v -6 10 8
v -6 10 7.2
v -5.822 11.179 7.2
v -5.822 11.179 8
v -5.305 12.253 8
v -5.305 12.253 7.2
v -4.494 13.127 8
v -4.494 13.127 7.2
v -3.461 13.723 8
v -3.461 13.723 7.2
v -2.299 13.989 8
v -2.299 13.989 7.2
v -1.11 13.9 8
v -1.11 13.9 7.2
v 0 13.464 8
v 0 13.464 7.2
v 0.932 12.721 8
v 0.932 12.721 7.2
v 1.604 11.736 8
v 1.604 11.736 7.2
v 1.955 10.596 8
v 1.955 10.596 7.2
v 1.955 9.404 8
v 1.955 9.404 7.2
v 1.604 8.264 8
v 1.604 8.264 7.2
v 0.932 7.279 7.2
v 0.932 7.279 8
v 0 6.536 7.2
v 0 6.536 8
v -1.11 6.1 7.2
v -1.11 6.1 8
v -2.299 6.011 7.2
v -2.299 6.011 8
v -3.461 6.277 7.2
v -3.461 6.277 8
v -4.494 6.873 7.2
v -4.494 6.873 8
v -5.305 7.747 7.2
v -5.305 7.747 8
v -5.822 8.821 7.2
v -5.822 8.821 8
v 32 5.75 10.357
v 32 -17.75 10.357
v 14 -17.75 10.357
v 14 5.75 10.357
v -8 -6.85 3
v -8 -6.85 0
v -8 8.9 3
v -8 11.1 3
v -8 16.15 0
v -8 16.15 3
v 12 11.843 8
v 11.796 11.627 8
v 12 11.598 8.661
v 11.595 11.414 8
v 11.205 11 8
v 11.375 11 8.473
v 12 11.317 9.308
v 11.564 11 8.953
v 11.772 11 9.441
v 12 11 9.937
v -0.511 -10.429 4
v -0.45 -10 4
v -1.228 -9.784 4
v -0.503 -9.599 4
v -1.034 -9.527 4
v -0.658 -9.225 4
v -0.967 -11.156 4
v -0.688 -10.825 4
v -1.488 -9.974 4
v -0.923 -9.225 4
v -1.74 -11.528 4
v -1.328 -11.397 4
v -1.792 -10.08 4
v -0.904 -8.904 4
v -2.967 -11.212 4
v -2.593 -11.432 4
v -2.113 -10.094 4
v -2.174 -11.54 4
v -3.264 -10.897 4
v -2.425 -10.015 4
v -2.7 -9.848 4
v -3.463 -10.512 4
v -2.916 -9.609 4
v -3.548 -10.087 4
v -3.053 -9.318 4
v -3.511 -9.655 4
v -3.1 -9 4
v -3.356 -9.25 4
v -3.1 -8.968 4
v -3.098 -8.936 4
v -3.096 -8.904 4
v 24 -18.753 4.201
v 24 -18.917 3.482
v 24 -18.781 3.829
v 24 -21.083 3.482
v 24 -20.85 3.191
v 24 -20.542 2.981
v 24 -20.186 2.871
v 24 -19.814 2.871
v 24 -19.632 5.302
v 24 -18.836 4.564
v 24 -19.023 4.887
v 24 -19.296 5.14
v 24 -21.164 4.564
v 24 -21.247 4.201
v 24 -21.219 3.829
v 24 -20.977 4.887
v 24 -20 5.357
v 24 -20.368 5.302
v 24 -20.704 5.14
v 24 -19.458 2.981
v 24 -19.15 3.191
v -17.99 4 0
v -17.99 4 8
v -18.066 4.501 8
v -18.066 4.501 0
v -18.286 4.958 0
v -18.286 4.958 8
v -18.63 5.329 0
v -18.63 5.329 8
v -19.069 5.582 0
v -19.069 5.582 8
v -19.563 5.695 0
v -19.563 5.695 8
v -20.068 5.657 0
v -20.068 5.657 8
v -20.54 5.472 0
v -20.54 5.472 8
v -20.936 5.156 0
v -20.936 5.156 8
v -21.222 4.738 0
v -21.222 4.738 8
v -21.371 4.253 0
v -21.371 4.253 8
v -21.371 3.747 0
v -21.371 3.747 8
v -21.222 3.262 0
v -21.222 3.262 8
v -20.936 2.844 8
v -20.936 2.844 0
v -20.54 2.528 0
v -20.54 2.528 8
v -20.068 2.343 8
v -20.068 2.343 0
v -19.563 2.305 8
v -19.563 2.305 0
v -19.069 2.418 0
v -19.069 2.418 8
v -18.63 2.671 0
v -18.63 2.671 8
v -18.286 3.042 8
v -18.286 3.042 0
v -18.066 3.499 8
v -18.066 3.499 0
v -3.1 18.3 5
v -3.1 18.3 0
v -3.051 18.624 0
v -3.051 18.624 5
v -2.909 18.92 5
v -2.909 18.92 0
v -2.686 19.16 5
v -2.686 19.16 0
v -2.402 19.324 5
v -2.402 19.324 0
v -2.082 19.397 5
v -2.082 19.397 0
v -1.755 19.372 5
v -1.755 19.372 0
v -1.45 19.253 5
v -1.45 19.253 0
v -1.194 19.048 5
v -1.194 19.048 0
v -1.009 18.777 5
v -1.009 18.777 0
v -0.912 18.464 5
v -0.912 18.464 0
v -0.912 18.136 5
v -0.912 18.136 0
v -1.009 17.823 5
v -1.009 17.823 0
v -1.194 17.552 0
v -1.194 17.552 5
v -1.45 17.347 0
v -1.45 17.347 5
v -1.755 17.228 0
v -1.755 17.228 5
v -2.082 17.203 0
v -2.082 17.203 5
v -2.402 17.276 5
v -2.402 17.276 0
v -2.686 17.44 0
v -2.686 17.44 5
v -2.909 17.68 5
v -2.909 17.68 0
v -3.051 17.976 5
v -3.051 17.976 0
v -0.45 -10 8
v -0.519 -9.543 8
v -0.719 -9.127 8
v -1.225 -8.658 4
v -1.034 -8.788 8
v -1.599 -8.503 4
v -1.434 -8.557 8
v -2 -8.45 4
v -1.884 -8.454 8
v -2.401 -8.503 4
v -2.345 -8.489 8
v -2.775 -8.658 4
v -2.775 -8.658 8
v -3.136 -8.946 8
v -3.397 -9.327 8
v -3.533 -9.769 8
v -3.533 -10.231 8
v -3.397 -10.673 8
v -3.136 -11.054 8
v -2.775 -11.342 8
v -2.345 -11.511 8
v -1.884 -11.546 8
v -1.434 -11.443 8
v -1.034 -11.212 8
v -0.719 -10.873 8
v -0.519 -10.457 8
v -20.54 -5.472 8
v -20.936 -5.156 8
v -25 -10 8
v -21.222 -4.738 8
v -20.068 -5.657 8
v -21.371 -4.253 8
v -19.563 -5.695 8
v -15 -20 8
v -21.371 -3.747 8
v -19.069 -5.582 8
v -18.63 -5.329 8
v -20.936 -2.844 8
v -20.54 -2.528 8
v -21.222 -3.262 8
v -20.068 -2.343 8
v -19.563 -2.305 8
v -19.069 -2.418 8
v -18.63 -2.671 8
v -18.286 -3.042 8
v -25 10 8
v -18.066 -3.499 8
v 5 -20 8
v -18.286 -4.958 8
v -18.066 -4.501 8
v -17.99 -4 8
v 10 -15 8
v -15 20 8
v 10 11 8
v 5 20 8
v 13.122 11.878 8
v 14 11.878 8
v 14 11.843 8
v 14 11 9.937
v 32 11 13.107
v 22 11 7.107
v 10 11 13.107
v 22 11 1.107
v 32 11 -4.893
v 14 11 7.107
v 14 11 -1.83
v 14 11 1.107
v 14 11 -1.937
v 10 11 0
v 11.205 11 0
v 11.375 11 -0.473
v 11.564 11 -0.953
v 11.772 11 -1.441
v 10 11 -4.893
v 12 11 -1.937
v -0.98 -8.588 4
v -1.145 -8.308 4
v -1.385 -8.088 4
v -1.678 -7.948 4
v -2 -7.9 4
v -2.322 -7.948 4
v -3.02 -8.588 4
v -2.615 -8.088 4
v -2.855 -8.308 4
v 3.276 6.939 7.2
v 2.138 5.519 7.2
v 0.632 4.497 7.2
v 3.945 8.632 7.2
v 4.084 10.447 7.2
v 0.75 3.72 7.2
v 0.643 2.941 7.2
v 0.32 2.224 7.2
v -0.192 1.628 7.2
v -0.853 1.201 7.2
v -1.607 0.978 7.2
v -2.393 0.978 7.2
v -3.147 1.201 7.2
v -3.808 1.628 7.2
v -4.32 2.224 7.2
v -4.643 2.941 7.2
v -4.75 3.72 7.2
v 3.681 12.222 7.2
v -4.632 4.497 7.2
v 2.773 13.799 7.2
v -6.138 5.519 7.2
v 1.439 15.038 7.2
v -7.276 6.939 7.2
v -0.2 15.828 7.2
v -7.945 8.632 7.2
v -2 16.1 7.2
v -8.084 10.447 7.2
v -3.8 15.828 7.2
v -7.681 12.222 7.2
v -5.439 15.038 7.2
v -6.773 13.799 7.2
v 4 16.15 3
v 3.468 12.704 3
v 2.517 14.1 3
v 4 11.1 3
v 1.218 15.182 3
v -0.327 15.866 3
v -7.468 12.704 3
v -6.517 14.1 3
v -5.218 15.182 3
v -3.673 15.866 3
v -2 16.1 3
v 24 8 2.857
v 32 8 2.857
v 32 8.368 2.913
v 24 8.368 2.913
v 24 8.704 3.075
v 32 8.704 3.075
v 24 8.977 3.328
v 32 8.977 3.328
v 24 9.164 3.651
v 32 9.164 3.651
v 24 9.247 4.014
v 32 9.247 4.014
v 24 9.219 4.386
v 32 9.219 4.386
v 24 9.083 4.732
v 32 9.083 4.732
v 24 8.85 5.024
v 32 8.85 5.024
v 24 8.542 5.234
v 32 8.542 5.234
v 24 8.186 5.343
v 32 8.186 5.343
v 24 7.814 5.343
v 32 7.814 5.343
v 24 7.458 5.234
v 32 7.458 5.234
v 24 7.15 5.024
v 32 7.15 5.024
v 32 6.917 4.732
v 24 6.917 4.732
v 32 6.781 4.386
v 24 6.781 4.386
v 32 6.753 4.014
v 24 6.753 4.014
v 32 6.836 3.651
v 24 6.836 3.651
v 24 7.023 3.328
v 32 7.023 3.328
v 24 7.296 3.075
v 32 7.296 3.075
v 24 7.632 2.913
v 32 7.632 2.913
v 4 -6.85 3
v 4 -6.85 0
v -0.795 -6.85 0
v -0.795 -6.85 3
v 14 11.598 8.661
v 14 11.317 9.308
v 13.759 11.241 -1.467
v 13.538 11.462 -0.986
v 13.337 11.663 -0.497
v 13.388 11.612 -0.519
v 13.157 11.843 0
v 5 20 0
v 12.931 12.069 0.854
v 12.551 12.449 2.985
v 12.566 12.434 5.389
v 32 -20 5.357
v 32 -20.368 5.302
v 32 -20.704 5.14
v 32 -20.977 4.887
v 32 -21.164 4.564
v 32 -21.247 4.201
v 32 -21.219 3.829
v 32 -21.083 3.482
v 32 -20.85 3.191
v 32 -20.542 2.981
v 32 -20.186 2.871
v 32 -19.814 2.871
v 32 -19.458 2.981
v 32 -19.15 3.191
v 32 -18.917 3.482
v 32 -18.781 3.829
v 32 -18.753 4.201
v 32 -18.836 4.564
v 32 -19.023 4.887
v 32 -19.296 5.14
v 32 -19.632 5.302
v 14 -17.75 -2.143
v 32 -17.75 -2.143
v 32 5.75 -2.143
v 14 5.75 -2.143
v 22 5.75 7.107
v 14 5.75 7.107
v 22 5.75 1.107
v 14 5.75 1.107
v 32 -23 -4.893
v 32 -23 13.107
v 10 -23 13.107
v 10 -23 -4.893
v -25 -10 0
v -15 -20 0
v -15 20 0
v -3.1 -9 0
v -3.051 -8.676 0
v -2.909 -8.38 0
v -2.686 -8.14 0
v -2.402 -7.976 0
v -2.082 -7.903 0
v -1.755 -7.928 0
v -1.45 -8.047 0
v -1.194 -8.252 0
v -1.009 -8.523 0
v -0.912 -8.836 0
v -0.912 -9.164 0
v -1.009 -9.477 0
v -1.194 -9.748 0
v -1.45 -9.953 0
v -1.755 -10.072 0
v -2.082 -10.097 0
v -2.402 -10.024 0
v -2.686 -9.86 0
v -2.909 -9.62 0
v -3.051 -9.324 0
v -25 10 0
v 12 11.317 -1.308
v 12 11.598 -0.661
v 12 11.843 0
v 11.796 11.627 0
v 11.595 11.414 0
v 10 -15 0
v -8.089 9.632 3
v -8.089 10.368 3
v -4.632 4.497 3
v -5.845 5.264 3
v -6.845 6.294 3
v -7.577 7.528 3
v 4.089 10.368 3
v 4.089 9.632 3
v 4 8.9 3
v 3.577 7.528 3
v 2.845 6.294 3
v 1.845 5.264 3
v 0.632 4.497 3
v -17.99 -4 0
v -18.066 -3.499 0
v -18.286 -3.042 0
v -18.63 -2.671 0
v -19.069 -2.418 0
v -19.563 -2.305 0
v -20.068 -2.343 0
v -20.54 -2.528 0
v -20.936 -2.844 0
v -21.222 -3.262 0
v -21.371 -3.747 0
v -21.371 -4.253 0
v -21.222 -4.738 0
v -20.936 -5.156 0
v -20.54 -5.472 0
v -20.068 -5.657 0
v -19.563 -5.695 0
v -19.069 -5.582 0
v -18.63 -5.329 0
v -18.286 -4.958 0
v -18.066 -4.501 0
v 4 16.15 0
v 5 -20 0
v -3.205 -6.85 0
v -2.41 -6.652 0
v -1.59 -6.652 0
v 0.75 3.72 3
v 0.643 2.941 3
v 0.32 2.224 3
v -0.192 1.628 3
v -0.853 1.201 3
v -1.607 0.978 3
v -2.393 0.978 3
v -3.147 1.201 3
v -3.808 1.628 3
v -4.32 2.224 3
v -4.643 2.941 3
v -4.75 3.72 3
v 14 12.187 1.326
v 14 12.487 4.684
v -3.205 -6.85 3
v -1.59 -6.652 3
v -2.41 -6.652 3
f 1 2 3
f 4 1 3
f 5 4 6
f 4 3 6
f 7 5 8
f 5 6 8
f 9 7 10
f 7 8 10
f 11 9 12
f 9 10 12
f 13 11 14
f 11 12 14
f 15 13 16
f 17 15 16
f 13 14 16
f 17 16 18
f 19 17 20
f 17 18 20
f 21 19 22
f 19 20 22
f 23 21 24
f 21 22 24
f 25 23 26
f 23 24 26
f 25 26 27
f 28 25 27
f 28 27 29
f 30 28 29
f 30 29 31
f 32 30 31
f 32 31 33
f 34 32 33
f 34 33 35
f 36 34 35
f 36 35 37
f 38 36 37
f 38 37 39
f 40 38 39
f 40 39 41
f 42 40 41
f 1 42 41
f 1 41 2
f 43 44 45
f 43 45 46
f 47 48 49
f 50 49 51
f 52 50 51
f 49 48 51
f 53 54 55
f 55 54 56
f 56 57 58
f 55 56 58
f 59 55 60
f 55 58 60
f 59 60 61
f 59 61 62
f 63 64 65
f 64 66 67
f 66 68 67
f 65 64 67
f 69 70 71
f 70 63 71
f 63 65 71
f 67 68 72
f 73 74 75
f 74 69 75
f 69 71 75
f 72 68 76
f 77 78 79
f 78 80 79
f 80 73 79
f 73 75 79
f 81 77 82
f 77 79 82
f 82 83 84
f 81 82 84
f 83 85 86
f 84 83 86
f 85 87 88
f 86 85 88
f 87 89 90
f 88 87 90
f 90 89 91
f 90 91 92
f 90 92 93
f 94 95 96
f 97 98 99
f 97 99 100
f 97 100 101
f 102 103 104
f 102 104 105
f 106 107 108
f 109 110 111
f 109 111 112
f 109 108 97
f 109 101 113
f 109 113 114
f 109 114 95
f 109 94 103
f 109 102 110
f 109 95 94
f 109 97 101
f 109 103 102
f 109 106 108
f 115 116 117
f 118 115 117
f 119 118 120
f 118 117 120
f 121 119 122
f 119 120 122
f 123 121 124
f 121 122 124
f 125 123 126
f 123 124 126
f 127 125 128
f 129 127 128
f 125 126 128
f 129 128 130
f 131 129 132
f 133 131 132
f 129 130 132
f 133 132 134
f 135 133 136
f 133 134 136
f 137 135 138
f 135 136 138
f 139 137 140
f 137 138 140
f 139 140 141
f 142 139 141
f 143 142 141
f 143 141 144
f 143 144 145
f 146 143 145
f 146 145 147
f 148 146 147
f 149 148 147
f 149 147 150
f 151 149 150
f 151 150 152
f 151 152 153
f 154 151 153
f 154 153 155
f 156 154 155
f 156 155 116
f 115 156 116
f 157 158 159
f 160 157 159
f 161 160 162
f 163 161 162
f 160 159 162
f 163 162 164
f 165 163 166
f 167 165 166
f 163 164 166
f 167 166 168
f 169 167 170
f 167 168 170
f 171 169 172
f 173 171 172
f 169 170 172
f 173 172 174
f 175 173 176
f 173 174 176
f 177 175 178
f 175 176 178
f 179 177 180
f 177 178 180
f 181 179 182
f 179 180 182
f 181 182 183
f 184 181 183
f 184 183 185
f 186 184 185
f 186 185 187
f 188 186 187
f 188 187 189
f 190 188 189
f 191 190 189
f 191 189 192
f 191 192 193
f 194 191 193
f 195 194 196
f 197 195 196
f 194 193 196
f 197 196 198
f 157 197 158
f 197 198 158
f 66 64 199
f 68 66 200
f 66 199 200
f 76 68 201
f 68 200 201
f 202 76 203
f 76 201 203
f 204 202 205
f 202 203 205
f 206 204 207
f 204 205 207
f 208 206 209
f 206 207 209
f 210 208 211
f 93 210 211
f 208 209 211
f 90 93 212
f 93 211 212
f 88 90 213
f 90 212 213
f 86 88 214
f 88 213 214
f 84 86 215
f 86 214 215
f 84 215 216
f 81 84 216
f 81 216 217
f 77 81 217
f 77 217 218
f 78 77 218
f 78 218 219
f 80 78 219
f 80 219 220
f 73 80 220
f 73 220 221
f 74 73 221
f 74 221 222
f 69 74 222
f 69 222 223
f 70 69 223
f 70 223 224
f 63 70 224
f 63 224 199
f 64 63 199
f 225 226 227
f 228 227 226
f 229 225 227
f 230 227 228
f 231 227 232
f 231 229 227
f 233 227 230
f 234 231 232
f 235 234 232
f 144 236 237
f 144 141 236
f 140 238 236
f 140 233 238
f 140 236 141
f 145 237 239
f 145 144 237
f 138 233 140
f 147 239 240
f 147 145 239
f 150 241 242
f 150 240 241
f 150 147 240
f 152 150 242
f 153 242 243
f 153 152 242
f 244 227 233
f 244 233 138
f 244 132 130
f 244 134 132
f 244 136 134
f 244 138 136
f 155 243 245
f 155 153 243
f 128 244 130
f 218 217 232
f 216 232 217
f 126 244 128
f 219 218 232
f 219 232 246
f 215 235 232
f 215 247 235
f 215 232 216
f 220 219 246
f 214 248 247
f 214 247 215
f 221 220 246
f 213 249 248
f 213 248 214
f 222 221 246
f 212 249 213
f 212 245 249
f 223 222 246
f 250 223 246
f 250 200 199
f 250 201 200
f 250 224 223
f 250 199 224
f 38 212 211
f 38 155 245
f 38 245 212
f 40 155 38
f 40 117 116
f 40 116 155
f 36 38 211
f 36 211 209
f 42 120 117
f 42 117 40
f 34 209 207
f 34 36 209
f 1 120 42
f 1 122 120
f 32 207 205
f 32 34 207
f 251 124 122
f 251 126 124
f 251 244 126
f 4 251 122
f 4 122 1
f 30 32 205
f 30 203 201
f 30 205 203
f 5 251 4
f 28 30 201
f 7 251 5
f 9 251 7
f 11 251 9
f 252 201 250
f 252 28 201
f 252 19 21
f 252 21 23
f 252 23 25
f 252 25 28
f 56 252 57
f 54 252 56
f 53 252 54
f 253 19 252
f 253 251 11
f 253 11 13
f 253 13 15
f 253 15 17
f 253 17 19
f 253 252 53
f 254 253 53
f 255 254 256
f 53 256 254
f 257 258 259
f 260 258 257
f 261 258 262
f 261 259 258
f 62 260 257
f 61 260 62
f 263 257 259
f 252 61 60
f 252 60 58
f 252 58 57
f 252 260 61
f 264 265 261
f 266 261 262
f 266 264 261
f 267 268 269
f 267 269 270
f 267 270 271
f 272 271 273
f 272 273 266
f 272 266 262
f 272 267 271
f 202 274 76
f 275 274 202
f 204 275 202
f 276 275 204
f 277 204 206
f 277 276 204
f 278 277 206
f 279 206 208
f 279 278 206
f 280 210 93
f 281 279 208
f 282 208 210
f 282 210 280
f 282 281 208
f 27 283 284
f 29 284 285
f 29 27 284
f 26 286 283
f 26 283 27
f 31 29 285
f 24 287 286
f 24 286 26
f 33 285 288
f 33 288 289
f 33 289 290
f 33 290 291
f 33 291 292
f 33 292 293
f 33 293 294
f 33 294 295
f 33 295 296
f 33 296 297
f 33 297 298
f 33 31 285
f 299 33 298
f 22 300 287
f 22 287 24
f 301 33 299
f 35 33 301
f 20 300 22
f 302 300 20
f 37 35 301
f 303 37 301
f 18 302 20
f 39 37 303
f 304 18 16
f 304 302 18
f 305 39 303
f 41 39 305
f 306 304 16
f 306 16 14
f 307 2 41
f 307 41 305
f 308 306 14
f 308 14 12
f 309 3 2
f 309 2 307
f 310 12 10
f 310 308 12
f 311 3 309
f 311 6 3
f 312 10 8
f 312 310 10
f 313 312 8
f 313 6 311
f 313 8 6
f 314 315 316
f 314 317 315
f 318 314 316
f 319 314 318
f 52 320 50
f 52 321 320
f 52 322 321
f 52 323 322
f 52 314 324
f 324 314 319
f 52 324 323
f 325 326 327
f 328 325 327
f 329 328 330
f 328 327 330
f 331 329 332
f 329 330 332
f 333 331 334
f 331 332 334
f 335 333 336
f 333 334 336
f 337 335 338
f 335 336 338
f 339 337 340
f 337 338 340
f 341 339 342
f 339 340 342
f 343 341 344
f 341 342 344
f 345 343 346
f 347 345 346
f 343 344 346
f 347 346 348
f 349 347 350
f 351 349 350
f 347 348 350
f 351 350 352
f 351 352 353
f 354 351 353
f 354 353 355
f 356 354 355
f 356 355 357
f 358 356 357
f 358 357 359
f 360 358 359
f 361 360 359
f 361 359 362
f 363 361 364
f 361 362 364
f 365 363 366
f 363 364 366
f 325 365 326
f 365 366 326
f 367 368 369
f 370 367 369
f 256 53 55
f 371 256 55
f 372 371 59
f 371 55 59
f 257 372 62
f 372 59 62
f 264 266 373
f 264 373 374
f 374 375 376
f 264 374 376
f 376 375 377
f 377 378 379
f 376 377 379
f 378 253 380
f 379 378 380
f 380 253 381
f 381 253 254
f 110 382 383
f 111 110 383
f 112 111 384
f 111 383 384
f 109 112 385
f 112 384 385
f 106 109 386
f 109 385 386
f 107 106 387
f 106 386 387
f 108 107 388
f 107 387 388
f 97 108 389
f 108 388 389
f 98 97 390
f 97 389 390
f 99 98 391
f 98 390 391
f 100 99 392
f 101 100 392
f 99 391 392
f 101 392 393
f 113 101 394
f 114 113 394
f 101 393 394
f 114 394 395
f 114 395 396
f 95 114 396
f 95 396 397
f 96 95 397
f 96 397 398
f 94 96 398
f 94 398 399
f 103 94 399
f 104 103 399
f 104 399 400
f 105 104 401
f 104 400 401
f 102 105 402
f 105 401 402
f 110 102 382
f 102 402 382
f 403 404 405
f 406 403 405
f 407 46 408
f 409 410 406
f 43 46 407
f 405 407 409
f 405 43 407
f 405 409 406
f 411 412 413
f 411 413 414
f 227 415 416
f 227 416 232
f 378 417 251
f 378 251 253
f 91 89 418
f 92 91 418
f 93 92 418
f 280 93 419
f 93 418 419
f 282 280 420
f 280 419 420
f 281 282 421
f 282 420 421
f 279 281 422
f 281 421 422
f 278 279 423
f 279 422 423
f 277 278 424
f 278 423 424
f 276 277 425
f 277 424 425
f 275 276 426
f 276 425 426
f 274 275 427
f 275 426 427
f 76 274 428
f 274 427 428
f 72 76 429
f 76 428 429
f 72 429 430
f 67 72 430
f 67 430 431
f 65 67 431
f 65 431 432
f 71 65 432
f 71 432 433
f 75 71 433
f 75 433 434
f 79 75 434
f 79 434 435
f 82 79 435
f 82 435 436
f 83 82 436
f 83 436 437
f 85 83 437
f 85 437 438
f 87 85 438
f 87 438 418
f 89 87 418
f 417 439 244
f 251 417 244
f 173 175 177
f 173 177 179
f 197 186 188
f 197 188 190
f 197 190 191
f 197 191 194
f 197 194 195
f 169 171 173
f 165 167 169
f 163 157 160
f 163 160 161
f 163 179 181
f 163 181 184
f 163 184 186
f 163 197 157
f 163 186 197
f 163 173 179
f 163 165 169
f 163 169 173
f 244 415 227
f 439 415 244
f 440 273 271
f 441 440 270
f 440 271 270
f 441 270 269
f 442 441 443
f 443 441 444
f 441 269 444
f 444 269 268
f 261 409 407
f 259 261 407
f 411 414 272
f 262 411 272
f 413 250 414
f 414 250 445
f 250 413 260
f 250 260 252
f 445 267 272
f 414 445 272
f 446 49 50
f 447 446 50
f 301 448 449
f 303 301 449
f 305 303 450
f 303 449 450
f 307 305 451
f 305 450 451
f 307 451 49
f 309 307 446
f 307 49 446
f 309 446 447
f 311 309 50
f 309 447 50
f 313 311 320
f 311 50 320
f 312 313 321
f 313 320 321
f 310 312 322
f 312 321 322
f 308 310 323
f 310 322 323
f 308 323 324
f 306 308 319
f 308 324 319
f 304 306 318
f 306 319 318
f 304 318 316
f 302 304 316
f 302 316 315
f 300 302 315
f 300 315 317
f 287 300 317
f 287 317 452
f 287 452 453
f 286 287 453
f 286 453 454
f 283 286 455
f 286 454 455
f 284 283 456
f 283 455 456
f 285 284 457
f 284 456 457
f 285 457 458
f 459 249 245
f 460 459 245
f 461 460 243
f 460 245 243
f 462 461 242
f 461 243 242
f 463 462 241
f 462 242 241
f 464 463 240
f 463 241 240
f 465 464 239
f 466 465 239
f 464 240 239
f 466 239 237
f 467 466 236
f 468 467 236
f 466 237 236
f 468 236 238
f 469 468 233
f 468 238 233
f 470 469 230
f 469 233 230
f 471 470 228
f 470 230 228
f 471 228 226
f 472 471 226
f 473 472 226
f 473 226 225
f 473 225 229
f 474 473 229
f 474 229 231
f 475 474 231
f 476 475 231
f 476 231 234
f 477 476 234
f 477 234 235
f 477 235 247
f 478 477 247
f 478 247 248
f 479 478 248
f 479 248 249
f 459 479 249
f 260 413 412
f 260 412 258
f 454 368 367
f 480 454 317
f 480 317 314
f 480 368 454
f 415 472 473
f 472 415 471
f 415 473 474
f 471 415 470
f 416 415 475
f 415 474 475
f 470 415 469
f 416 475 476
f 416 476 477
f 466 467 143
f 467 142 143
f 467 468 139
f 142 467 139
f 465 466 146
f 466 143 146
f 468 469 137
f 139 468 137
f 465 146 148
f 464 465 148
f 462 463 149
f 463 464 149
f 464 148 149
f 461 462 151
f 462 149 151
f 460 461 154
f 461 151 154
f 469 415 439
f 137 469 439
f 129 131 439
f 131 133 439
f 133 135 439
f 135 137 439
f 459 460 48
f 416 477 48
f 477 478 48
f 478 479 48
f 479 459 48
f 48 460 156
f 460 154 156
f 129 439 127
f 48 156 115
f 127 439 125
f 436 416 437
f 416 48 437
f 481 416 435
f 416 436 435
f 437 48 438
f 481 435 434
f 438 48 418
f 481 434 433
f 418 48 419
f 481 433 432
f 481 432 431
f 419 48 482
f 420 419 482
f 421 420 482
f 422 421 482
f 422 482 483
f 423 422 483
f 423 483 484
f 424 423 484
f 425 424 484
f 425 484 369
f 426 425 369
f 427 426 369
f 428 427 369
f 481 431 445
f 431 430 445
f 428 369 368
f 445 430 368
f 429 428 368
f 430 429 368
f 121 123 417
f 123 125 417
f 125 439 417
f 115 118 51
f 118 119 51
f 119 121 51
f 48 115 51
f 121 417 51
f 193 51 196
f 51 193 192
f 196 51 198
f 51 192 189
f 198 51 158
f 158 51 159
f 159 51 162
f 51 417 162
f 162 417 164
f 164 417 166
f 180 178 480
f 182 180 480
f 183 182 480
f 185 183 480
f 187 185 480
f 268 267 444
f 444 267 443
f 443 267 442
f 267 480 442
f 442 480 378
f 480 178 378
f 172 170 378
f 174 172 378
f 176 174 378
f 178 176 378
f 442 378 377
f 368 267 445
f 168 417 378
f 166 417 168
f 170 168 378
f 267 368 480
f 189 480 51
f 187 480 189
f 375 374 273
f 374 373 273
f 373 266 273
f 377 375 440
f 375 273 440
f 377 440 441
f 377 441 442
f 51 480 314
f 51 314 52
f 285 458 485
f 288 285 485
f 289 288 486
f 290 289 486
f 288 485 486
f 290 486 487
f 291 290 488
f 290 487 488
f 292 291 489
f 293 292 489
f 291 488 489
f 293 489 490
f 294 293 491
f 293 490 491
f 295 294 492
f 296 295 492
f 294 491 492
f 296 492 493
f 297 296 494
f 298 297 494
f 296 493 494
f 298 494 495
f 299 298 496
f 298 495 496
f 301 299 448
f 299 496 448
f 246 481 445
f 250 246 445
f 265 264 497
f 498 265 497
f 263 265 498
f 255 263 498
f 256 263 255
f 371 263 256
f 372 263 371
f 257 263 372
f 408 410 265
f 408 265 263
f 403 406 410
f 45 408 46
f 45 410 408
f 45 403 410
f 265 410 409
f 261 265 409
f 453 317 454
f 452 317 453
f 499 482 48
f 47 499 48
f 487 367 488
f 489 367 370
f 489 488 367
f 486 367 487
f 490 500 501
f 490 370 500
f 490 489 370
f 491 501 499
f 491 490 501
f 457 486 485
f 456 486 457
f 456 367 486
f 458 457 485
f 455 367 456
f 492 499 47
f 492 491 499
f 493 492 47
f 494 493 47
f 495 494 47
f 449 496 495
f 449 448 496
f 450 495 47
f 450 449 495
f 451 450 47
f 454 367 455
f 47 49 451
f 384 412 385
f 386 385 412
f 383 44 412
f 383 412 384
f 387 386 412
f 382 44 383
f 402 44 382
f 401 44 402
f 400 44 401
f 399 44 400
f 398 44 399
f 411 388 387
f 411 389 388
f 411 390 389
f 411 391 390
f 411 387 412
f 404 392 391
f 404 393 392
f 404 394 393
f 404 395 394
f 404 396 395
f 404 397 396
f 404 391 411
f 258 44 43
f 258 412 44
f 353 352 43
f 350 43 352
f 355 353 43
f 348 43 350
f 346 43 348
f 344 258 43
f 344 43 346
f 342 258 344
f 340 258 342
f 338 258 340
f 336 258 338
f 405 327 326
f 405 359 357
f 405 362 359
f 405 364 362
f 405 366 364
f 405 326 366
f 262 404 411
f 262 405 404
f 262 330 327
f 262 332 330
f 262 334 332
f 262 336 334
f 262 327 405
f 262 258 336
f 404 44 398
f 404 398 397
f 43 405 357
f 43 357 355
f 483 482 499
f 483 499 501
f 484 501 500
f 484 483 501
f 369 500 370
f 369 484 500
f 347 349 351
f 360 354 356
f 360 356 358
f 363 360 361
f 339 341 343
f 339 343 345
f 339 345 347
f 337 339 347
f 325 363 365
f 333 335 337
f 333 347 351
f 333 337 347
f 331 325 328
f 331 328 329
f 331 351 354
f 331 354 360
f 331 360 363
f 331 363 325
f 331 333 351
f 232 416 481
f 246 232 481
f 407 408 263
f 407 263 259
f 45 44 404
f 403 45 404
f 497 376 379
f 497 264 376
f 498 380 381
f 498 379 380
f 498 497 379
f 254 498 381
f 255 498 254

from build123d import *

# Parameters (mm, degrees)
SKETCH_1_W                = 50
SKETCH_1_H                = 40
EXTRUDE_1_DEPTH           = 8
CHAMFER_1_SIZE            = 10
SKETCH_2_R                = 1.55
CUT_EXTRUDE_1_DEPTH       = 10
EXTRUDE_2_DEPTH           = 40
EXTRUDE_2_DEPTH_BACK      = 15
SKETCH_3_R                = 12.5
SKETCH_4_R                = 1.7
CUT_EXTRUDE_2_DEPTH       = 15
CUT_EXTRUDE_START         = -20
CUT_EXTRUDE_3_DEPTH       = 20
SKETCH_7_R                = 16.5
CUT_EXTRUDE_8_DEPTH       = 33
CUT_EXTRUDE_9_DEPTH       = 20
CHAMFER_3_SIZE            = 2
SKETCH_10_OUTSIDE_W       = 47.322
SKETCH_10_OUTSIDE_H       = 62.322
SKETCH_10_OUTSIDE_R       = 12.5
CUT_EXTRUDE_10_DEPTH      = 10
CHAMFER_4_SIZE            = 10
SKETCH_12_W               = 1.5
SKETCH_12_H               = 20
SKETCH_14_W               = 12
SKETCH_14_H               = 23
CUT_EXTRUDE_11_DEPTH      = 3
CUT_EXTRUDE_12_DEPTH      = 4.2
SKETCH_16_R               = 1.1
CUT_EXTRUDE_13_DEPTH      = 5
SKETCH_17_R               = 3.372674955
EXTRUDE_3_DEPTH           = 4
SKETCH_18_R               = 1.1
CUT_EXTRUDE_14_DEPTH      = 4
SKETCH_20_R               = 4
CUT_EXTRUDE_15_DEPTH      = 4
CUT_EXTRUDE_16_DEPTH      = 70.980354503
CUT_EXTRUDE_16_DEPTH_BACK = 70.980354503
SKETCH_21_W               = 56.3061188
SKETCH_21_H               = 46.683670243
EXTRUDE_4_DEPTH           = 18
EXTRUDE_4_DEPTH_BACK      = 4
SKETCH_22_W               = 18
SKETCH_22_H               = 34
SKETCH_23_W               = 12.5
SKETCH_23_H               = 23.5
CUT_EXTRUDE_17_DEPTH      = 18
SKETCH_24_R               = 1.25
CUT_EXTRUDE_18_DEPTH      = 8
CUT_EXTRUDE_19_DEPTH      = 64.641574462
SKETCH_26_W               = 8
SKETCH_26_H               = 6
CUT_EXTRUDE_20_DEPTH      = 20


# Read off the part's stored shape, not the designer's step: 切除-拉伸3
with BuildPart() as part:
    # 草图1 → 凸台-拉伸1 (new body)
    with BuildSketch(Plane.XY):
        Rectangle(SKETCH_1_W, SKETCH_1_H)
    extrude(amount=EXTRUDE_1_DEPTH)

    # 倒角1
    chamfer_1_edges = [part.edges().sort_by_distance(p)[0] for p in [
        (-25, -20, 4),
        (-25, 20, 4),
    ]]
    chamfer(chamfer_1_edges, length=CHAMFER_1_SIZE)

    # 草图2 → 切除-拉伸1 (cut)
    with BuildSketch(Plane.XY.offset(8)):
        with Locations((-2, -10)):
            Circle(SKETCH_2_R)
        with Locations((-2, 10)):
            Circle(SKETCH_2_R)
    extrude(amount=-CUT_EXTRUDE_1_DEPTH, mode=Mode.SUBTRACT)

    # 草图3 → 凸台-拉伸2 (add, two sides: drawn at the far end of the back side and taken through both)
    with BuildSketch(Plane(origin=(25, 0, 0), x_dir=(0, 0, -1), z_dir=(1, 0, 0)).offset(-EXTRUDE_2_DEPTH_BACK)):
        with Locations(Location((-4, 0, 0), (0, 0, 251.337075115))):
            Circle(SKETCH_3_R)
    extrude(amount=EXTRUDE_2_DEPTH + EXTRUDE_2_DEPTH_BACK)

    # 草图4 → 切除-拉伸2 (cut)
    with BuildSketch(Plane.XY.offset(8)):
        with Locations((-19.690178066, -4)):
            Circle(SKETCH_4_R)
        with Locations((-19.690178066, 4)):
            Circle(SKETCH_4_R)
    extrude(amount=-CUT_EXTRUDE_2_DEPTH, mode=Mode.SUBTRACT)

    # 切除-拉伸3 outline → 切除-拉伸3 (cut)
    with BuildSketch(Plane(origin=(65, 0, 0), x_dir=(0, 0, -1), z_dir=(1, 0, 0)).offset(CUT_EXTRUDE_START)):
        with BuildLine():
            Line((7.456439237, -5), (-15.456439237, -5))
            ThreePointArc((-15.456439237, -5), (-4, -12.5), (7.456439237, -5))
        make_face()
        with BuildLine():
            ThreePointArc((7.456439237, 5), (-4, 12.5), (-15.456439237, 5))
            Line((-15.456439237, 5), (7.456439237, 5))
        make_face()
    extrude(amount=CUT_EXTRUDE_3_DEPTH, mode=Mode.SUBTRACT)

    # 草图7 → 切除-拉伸8 (cut)
    with BuildSketch(Plane.XZ.offset(5)):
        with Locations((48.5, 4)):
            Circle(SKETCH_7_R)
    cut_extrude_8 = extrude(amount=CUT_EXTRUDE_8_DEPTH, mode=Mode.SUBTRACT)

    # 镜向1: 切除-拉伸8 across plane
    add(cut_extrude_8.mirror(Plane.ZX), mode=Mode.SUBTRACT)

    # 草图8 → 切除-拉伸9 (cut)
    with BuildSketch(Plane.XZ.offset(5)):
        with BuildLine():
            Line((50, 19.107397707), (75.764252489, 33.62580965))
            Line((75.764252489, 33.62580965), (78.826270749, -18.347337912))
            Line((78.826270749, -18.347337912), (50, -10.892602293))
            ThreePointArc((50, -10.892602293), (65, 4.107397707), (50, 19.107397707))
        make_face()
    extrude(amount=-CUT_EXTRUDE_9_DEPTH, mode=Mode.SUBTRACT)

    # 倒角3
    chamfer_3_edges = [part.edges().sort_by_distance(p)[0] for p in [
        (10, 0, 16.5),
        (10, 0, -8.5),
    ]]
    chamfer(chamfer_3_edges, length=CHAMFER_3_SIZE)

    # 草图10 outside → 切除-拉伸10 (cut)
    with BuildSketch(Plane(origin=(25, 0, 0), x_dir=(0, 0, -1), z_dir=(1, 0, 0))):
        with Locations((-4, 0)):
            Rectangle(SKETCH_10_OUTSIDE_W, SKETCH_10_OUTSIDE_H)
        with Locations((-4.107397707, 0)):
            Circle(SKETCH_10_OUTSIDE_R, mode=Mode.SUBTRACT)
    extrude(amount=-CUT_EXTRUDE_10_DEPTH, mode=Mode.SUBTRACT)

    # 倒角4
    # the kernel refuses this chamfer: 10 mm, written as the material it takes off along each edge
    with BuildSketch(Plane(origin=(15, -20, -25.71682988), x_dir=(-0.9996219169112968, -0.027495876610586317, 0), z_dir=(0, 0, 1))) as chamfer_4_piece_1_section:
        Polygon((CHAMFER_4_SIZE * 0.999621916911, -CHAMFER_4_SIZE * 0.0274958766106), (-CHAMFER_4_SIZE * 0.0274958766106, -CHAMFER_4_SIZE * 0.999621916911), (0, 0), align=None)
    chamfer_4_piece_1 = extrude(amount=59.433659759, mode=Mode.PRIVATE)
    chamfer_4_piece_1 = chamfer_4_piece_1 - Plane(origin=(11.669205873, 0, 4.107397707), x_dir=(0, 0, -1), z_dir=(1, 0, 0)) * Cylinder(12.5, 159, mode=Mode.PRIVATE)
    add(chamfer_4_piece_1, mode=Mode.SUBTRACT)
    with BuildSketch(Plane(origin=(15, 20, 33.71682988), x_dir=(-0.9996219169112968, 0.027495876610586317, 0), z_dir=(0, 0, -1))) as chamfer_4_piece_2_section:
        Polygon((CHAMFER_4_SIZE * 0.999621916911, -CHAMFER_4_SIZE * 0.0274958766106), (-CHAMFER_4_SIZE * 0.0274958766106, -CHAMFER_4_SIZE * 0.999621916911), (0, 0), align=None)
    chamfer_4_piece_2 = extrude(amount=59.433659759, mode=Mode.PRIVATE)
    chamfer_4_piece_2 = chamfer_4_piece_2 - Plane(origin=(11.669205873, 0, 4.107397707), x_dir=(0, 0, -1), z_dir=(1, 0, 0)) * Cylinder(12.5, 159, mode=Mode.PRIVATE)
    add(chamfer_4_piece_2, mode=Mode.SUBTRACT)

    # 草图12 → 切除-旋转2 (revolve, cut)
    with BuildSketch(Plane(origin=(0, 0, 0), x_dir=(1, 0, 0), z_dir=(0, 1, 0))):
        with Locations((14.75, 8.392602293)):
            Rectangle(SKETCH_12_W, SKETCH_12_H)
    revolve(axis=Axis((50, 0, 4.107397707), (-1, 0, 0)), mode=Mode.SUBTRACT)

    # 草图14 → 切除-拉伸11 (cut)
    with BuildSketch(Plane(origin=(0, 0, 0), x_dir=(-1, 0, 0), z_dir=(0, 0, -1))):
        with Locations((2, 4.65)):
            Rectangle(SKETCH_14_W, SKETCH_14_H)
    extrude(amount=-CUT_EXTRUDE_11_DEPTH, mode=Mode.SUBTRACT)

    # 草图15 → 切除-拉伸12 (cut)
    with BuildSketch(Plane(origin=(0, 0, 3), x_dir=(-1, 0, 0), z_dir=(0, 0, -1))):
        with BuildLine():
            ThreePointArc((4.631967524, 4.49702381), (2, 16.1), (-0.631967524, 4.49702381))
            ThreePointArc((-0.631967524, 4.49702381), (2, 0.95), (4.631967524, 4.49702381))
        make_face()
    extrude(amount=-CUT_EXTRUDE_12_DEPTH, mode=Mode.SUBTRACT)

    # 草图16 → 切除-拉伸13 (cut)
    with BuildSketch(Plane(origin=(0, 0, 0), x_dir=(-1, 0, 0), z_dir=(0, 0, -1))):
        with Locations((2, 18.3)):
            Circle(SKETCH_16_R)
    extrude(amount=-CUT_EXTRUDE_13_DEPTH, mode=Mode.SUBTRACT)

    # 草图17 → 凸台-拉伸3 (add)
    with BuildSketch(Plane(origin=(0, 0, 0), x_dir=(-1, 0, 0), z_dir=(0, 0, -1))):
        with Locations((2, -10)):
            Circle(SKETCH_17_R)
    extrude(amount=-EXTRUDE_3_DEPTH)

    # 草图18 → 切除-拉伸14 (cut)
    with BuildSketch(Plane(origin=(0, 0, 0), x_dir=(-1, 0, 0), z_dir=(0, 0, -1))):
        with Locations((2, -9)):
            Circle(SKETCH_18_R)
    extrude(amount=-CUT_EXTRUDE_14_DEPTH, mode=Mode.SUBTRACT)

    # 草图20 → 切除-拉伸15 (cut)
    with BuildSketch(Plane(origin=(0, 0, 7.2), x_dir=(-1, 0, 0), z_dir=(0, 0, -1))):
        with Locations((2, 10)):
            Circle(SKETCH_20_R)
    extrude(amount=-CUT_EXTRUDE_15_DEPTH, mode=Mode.SUBTRACT)

    # 草图21 → 切除-拉伸16 (cut, two sides: drawn at the far end of the back side and taken through both)
    with BuildSketch(Plane(origin=(0, 0, 0), x_dir=(-1, 0, 0), z_dir=(0, 0, -1)).offset(-CUT_EXTRUDE_16_DEPTH_BACK)):
        with Locations((-42.1530594, 7.959183123)):
            Rectangle(SKETCH_21_W, SKETCH_21_H)
    extrude(amount=CUT_EXTRUDE_16_DEPTH + CUT_EXTRUDE_16_DEPTH_BACK, mode=Mode.SUBTRACT)

    # 草图22 → 凸台-拉伸4 (add, two sides: drawn at the far end of the back side and taken through both)
    with BuildSketch(Plane(origin=(14, 0, 0), x_dir=(0, 0, -1), z_dir=(1, 0, 0)).offset(-EXTRUDE_4_DEPTH_BACK)):
        with Locations((-4.107397707, -6)):
            Rectangle(SKETCH_22_W, SKETCH_22_H)
    extrude(amount=EXTRUDE_4_DEPTH + EXTRUDE_4_DEPTH_BACK)

    # 草图23 → 切除-拉伸17 (cut)
    with BuildSketch(Plane(origin=(32, 0, 0), x_dir=(0, 0, -1), z_dir=(1, 0, 0))):
        with Locations((-4.107397707, -6)):
            Rectangle(SKETCH_23_W, SKETCH_23_H)
    extrude(amount=-CUT_EXTRUDE_17_DEPTH, mode=Mode.SUBTRACT)

    # 草图24 → 切除-拉伸18 (cut)
    with BuildSketch(Plane(origin=(32, 0, 0), x_dir=(0, 0, -1), z_dir=(1, 0, 0))):
        with Locations((-4.107397707, 8)):
            Circle(SKETCH_24_R)
        with Locations(Location((-4.107397707, -20, 0), (0, 0, 180))):
            Circle(SKETCH_24_R)
    extrude(amount=-CUT_EXTRUDE_18_DEPTH, mode=Mode.SUBTRACT)

    # 草图25 → 切除-拉伸19 (cut, through all)
    with BuildSketch(Plane(origin=(32, 0, 0), x_dir=(0, 0, -1), z_dir=(1, 0, 0))):
        with BuildLine():
            Line((-13.107397707, -8.561851845), (-13.107397707, 8.561851845))
            ThreePointArc((-13.107397707, 8.561851845), (-16.5, 0), (-13.107397707, -8.561851845))
        make_face()
        with BuildLine():
            Line((4.892602293, -8.784738155), (4.892602293, 8.784738155))
            ThreePointArc((4.892602293, 8.784738155), (8.5, 0), (4.892602293, -8.784738155))
        make_face()
    extrude(amount=-CUT_EXTRUDE_19_DEPTH, mode=Mode.SUBTRACT)

    # 草图26 → 切除-拉伸20 (cut)
    with BuildSketch(Plane.XZ.offset(-5.75)):
        with Locations((18, 4.107397707)):
            Rectangle(SKETCH_26_W, SKETCH_26_H)
    extrude(amount=-CUT_EXTRUDE_20_DEPTH, mode=Mode.SUBTRACT)


solid = part.part
